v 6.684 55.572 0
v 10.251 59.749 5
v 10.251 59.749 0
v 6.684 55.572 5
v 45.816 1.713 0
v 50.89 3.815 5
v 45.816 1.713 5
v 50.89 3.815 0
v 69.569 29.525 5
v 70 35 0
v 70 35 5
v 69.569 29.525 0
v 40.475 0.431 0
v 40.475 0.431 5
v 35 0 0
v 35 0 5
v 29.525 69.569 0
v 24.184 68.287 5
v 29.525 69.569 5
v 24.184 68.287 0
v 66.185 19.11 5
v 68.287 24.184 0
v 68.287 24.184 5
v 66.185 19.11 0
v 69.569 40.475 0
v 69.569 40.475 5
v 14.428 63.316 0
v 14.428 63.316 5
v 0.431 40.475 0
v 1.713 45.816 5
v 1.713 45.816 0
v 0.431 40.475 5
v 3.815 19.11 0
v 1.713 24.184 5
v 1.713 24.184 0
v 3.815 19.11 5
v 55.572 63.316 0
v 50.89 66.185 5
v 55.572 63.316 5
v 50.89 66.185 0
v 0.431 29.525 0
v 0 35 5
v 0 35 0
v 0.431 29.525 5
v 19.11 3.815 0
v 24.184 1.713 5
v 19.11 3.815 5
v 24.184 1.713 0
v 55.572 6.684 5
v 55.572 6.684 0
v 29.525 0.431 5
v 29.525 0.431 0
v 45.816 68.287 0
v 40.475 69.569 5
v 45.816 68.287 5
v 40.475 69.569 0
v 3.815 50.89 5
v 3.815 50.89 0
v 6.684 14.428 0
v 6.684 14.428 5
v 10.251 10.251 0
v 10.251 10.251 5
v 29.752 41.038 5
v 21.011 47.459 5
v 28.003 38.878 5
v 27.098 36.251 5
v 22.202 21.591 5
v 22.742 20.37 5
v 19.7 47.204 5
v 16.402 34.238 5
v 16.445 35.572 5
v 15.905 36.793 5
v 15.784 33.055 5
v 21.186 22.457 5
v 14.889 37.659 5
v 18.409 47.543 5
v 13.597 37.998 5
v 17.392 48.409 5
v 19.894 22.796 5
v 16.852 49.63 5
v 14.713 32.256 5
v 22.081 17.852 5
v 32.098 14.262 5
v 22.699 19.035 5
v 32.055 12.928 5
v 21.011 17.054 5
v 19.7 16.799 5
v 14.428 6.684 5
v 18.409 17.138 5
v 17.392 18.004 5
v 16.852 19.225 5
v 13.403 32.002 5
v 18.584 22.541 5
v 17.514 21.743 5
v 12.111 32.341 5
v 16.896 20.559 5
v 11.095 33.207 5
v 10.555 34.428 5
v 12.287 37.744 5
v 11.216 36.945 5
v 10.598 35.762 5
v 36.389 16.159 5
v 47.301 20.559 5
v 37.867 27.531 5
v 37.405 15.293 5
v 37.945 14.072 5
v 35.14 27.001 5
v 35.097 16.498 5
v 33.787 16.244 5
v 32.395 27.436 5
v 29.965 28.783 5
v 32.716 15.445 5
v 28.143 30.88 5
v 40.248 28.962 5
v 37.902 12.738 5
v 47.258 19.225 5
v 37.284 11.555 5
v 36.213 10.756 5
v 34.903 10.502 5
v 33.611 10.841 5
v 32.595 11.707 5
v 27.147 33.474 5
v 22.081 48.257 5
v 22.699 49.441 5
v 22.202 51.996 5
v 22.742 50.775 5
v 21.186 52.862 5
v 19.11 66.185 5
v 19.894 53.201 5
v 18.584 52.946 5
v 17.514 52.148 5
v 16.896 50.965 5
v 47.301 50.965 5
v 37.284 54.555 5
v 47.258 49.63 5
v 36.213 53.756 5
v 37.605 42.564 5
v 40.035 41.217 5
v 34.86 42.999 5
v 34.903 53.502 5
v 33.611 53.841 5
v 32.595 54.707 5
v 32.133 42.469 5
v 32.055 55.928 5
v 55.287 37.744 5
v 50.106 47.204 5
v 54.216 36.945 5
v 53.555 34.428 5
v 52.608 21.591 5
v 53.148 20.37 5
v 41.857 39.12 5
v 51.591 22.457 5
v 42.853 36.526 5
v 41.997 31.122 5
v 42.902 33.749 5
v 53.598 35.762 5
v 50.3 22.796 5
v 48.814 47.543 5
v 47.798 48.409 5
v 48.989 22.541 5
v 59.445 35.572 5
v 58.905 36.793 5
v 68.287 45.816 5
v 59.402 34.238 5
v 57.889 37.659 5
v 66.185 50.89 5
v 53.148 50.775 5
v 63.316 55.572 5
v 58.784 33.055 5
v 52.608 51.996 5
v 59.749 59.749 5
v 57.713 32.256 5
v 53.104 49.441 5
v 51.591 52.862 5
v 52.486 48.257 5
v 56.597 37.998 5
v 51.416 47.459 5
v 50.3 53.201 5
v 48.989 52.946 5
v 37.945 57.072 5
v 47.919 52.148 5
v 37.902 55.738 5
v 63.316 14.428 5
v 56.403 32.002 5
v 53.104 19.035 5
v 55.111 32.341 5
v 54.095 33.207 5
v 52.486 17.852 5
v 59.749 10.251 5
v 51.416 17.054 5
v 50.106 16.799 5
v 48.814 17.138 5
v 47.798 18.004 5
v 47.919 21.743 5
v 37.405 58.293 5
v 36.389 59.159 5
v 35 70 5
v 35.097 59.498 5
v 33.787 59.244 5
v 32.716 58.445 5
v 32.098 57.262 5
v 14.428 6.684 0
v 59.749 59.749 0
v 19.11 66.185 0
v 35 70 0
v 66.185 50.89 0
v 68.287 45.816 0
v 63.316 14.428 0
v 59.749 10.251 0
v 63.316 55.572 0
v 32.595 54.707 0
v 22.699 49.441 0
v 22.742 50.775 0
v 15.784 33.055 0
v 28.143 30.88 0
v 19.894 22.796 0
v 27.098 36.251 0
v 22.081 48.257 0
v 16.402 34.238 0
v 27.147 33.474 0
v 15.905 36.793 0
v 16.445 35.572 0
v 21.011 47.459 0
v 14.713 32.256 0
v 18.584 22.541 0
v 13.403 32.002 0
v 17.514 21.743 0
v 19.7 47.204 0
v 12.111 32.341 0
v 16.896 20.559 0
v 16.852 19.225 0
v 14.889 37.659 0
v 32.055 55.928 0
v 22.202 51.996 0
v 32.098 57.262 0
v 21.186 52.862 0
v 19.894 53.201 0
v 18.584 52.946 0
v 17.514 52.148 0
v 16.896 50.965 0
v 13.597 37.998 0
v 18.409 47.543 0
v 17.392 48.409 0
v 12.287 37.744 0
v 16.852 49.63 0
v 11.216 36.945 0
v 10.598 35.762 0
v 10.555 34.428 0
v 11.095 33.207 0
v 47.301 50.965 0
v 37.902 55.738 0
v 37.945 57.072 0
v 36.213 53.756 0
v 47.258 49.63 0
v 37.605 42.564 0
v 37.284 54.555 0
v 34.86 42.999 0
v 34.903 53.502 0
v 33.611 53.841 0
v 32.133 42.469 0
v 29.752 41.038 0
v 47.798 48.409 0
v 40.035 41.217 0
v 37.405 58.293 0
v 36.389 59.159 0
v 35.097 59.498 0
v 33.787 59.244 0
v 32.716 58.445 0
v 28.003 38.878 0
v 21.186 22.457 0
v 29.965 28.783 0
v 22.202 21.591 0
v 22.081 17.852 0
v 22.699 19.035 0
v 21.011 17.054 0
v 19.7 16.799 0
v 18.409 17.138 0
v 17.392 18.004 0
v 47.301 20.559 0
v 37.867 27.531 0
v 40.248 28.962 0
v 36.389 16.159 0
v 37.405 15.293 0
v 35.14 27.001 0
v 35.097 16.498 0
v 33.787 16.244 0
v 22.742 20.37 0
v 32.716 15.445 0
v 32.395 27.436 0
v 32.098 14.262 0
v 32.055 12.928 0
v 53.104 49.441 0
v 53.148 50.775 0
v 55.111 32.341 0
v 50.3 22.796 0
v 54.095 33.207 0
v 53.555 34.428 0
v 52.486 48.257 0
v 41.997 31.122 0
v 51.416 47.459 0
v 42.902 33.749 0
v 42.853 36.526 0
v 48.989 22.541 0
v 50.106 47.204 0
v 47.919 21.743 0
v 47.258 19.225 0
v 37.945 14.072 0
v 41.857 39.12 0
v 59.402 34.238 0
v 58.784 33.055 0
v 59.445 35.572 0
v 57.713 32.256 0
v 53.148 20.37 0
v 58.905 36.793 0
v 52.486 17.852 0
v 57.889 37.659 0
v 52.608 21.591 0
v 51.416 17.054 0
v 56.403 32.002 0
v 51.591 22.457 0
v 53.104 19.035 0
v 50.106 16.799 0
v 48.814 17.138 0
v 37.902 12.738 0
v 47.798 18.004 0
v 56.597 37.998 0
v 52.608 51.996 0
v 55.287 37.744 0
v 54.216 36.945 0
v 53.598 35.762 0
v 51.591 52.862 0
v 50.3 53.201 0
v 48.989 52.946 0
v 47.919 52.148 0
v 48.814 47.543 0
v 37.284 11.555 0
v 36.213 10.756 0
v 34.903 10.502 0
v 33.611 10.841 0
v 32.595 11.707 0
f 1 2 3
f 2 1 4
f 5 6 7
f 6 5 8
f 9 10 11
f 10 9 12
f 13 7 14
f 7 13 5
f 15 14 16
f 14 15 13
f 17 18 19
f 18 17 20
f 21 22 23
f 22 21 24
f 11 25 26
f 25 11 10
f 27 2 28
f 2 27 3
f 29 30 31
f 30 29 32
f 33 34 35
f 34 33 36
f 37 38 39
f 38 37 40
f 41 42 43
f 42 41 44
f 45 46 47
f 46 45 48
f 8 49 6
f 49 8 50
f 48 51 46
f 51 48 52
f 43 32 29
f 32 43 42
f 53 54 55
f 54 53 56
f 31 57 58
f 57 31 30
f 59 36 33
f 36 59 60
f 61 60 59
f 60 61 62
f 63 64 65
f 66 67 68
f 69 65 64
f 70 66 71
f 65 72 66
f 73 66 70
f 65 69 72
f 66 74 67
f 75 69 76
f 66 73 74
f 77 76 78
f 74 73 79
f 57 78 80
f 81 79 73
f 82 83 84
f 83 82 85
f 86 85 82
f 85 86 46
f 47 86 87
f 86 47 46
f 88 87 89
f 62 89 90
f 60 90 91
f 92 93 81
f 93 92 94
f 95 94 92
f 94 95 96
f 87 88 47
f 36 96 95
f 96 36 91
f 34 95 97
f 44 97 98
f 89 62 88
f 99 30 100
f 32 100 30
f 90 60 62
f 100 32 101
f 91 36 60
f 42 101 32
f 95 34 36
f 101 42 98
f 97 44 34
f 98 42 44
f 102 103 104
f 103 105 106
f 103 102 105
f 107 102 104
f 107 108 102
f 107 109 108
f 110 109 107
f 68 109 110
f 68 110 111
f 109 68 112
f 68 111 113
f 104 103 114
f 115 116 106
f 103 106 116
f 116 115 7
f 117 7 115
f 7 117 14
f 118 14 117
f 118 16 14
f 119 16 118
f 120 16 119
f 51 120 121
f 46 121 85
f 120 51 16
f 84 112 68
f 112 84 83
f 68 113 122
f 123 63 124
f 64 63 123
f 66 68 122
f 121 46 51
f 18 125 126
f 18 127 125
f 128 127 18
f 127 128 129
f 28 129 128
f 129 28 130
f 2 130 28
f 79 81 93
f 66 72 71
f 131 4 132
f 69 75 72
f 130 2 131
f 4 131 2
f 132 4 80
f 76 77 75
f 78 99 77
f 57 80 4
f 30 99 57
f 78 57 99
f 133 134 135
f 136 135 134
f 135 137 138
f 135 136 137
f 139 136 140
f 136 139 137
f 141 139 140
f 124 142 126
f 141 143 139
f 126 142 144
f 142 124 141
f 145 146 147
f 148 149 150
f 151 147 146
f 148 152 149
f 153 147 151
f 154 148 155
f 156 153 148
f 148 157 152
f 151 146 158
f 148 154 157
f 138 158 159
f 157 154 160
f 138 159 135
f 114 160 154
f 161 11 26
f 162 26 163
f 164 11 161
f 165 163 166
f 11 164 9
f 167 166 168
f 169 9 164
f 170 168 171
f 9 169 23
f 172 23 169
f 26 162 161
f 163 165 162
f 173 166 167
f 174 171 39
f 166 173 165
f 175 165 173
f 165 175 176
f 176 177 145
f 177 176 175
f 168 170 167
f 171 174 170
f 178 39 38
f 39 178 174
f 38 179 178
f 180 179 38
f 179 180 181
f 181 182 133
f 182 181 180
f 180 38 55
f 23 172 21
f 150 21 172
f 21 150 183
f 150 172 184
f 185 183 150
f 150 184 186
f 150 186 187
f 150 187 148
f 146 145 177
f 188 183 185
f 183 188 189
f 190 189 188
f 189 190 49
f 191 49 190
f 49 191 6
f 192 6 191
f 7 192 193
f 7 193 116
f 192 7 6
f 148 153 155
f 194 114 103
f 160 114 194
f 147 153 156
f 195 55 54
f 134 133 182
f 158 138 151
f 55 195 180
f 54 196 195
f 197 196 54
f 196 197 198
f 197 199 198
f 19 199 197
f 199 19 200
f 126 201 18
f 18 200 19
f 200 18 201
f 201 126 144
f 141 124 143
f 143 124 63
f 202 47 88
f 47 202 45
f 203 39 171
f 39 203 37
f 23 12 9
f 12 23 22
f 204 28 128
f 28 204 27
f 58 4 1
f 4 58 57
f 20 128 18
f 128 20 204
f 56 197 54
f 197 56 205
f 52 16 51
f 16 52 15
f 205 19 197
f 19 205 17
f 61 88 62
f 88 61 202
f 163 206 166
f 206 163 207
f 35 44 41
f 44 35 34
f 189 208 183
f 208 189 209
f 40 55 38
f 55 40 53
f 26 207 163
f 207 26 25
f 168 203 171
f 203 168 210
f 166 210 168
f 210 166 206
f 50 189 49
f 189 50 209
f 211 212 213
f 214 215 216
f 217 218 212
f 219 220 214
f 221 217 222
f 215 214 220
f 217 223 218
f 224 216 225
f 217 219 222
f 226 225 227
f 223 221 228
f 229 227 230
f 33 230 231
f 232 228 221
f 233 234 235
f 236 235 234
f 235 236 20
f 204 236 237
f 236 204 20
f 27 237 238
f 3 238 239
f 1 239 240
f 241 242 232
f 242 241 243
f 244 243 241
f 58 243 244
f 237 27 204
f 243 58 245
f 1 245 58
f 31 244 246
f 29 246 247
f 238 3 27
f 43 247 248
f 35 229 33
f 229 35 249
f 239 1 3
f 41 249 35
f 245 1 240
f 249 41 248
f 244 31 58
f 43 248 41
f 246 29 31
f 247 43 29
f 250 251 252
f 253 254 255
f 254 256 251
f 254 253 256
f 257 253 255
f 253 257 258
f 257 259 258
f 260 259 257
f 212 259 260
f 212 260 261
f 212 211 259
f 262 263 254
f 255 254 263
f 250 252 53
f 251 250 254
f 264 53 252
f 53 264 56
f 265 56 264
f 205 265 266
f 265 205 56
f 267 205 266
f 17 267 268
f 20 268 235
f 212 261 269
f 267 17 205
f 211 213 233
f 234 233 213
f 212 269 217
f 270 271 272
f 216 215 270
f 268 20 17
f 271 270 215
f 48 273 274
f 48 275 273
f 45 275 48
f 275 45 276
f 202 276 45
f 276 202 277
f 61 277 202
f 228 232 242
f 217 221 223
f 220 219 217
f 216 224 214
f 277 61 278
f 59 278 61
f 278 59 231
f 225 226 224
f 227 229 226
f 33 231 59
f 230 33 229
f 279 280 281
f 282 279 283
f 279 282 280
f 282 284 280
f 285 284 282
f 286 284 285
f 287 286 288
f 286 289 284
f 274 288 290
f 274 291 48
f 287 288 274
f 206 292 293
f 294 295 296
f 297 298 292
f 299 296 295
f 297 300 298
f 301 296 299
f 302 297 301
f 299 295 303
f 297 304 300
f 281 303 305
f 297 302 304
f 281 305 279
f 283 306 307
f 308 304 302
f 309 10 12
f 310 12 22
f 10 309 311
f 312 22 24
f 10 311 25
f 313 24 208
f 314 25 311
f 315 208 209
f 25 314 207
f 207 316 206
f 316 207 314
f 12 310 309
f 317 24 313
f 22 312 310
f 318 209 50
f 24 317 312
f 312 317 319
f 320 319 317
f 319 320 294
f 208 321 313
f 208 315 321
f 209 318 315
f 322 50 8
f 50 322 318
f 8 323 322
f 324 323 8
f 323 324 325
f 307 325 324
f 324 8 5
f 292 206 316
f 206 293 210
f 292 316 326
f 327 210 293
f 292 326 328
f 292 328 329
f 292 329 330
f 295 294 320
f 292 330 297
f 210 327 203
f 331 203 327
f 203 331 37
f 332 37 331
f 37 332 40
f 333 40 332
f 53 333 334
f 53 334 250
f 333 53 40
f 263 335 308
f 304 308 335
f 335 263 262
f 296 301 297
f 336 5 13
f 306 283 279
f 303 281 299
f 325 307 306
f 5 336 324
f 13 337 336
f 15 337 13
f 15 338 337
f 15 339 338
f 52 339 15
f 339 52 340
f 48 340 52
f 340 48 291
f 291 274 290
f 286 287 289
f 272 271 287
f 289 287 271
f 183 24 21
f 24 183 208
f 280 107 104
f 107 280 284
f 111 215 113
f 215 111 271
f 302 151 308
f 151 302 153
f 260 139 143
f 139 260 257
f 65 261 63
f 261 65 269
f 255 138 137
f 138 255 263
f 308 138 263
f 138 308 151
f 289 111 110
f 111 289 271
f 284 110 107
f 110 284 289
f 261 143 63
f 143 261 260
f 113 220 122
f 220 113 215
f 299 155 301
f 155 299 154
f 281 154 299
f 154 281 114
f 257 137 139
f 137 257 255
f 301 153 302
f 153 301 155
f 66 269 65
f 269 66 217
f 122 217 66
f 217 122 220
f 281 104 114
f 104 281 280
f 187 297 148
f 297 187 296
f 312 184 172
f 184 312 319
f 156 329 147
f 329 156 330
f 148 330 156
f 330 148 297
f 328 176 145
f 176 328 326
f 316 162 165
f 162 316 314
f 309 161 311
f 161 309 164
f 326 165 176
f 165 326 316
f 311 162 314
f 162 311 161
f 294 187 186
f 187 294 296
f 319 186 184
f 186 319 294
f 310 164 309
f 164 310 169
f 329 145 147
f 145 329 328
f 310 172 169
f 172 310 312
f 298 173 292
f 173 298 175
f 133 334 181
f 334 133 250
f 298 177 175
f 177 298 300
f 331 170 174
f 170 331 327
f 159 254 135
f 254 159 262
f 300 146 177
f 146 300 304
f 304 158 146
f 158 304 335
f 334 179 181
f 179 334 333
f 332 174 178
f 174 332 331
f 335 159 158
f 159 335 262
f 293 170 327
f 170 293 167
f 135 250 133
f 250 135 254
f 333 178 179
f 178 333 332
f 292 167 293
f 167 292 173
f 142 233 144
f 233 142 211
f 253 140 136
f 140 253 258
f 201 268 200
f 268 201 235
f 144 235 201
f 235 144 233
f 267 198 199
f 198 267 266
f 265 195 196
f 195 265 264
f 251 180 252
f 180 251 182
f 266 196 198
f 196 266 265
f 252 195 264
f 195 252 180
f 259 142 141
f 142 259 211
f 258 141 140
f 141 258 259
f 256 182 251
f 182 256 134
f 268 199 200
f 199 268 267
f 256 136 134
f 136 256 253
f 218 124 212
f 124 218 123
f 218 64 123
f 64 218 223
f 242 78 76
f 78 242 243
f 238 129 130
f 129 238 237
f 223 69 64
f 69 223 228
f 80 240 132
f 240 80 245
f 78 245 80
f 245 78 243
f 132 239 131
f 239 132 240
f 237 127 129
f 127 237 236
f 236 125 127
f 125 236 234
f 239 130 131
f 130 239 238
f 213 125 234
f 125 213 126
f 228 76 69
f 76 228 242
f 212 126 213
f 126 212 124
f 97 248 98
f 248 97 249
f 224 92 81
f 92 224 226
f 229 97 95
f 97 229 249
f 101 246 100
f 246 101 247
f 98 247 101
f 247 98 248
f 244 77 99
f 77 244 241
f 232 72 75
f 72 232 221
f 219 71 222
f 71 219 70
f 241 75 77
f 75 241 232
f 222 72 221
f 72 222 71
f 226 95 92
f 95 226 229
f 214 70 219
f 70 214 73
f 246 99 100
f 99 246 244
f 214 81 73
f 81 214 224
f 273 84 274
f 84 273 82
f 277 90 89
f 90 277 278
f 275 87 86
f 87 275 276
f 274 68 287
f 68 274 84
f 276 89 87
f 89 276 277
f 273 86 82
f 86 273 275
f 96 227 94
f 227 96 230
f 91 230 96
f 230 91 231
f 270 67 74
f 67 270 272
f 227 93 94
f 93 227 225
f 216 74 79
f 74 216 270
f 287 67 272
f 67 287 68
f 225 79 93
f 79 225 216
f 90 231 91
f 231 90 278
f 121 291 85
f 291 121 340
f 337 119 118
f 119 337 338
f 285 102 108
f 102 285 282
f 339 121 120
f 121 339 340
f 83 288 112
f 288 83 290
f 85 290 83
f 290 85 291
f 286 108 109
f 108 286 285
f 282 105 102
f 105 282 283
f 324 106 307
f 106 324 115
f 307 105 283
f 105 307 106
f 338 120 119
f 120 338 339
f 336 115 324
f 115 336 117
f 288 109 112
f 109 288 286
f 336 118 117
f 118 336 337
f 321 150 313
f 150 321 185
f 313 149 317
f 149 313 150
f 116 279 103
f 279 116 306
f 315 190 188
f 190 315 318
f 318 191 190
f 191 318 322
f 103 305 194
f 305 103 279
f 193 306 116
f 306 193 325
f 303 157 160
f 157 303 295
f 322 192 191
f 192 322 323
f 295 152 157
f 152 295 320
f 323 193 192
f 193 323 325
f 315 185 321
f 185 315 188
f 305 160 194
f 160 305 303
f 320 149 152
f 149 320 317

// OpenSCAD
$fn = 32;

// ----------------------------------------------------------------------
// Spacer plate: round flange R35, 8 bolts
// ----------------------------------------------------------------------

// --- parameters (mm) ---
bore_r = 8;               // centre bore radius
bolt_r = 3;               // bolt hole radius
plate_t = 5;              // plate thickness, Z (extrusion height)
flange_r = 35;            // flange radius
n_bolt = 8;               // bolt hole count
ring_r = 21.5;            // bolt circle radius

profile = [[70, 35], [69.569, 40.475], [68.287, 45.816], [66.185, 50.89], [63.316, 55.572], [59.749, 59.749], [55.572, 63.316], [50.89, 66.185], [45.816, 68.287], [40.475, 69.569], [35, 70], [29.525, 69.569], [24.184, 68.287], [19.11, 66.185], [14.428, 63.316], [10.251, 59.749], [6.684, 55.572], [3.815, 50.89], [1.713, 45.816], [0.431, 40.475], [0, 35], [0.431, 29.525], [1.713, 24.184], [3.815, 19.11], [6.684, 14.428], [10.251, 10.251], [14.428, 6.684], [19.11, 3.815], [24.184, 1.713], [29.525, 0.431], [35, 0], [40.475, 0.431], [45.816, 1.713], [50.89, 3.815], [55.572, 6.684], [59.749, 10.251], [63.316, 14.428], [66.185, 19.11], [68.287, 24.184], [69.569, 29.525]];  // primary outline, 40 points, counter clockwise
void_1 = [[42.853, 36.526], [41.857, 39.12], [40.035, 41.217], [37.605, 42.564], [34.86, 42.999], [32.133, 42.469], [29.752, 41.038], [28.003, 38.878], [27.098, 36.251], [27.147, 33.474], [28.143, 30.88], [29.965, 28.783], [32.395, 27.436], [35.14, 27.001], [37.867, 27.531], [40.248, 28.962], [41.997, 31.122], [42.902, 33.749]];  // centre bore, 18 points
void_2 = [[59.445, 35.572], [58.905, 36.793], [57.889, 37.659], [56.597, 37.998], [55.287, 37.744], [54.216, 36.945], [53.598, 35.762], [53.555, 34.428], [54.095, 33.207], [55.111, 32.341], [56.403, 32.002], [57.713, 32.256], [58.784, 33.055], [59.402, 34.238]];  // bolt hole 1, 14 points
void_3 = [[53.148, 50.775], [52.608, 51.996], [51.591, 52.862], [50.3, 53.201], [48.989, 52.946], [47.919, 52.148], [47.301, 50.965], [47.258, 49.63], [47.798, 48.409], [48.814, 47.543], [50.106, 47.204], [51.416, 47.459], [52.486, 48.257], [53.104, 49.441]];  // bolt hole 2, 14 points
void_4 = [[37.945, 57.072], [37.405, 58.293], [36.389, 59.159], [35.097, 59.498], [33.787, 59.244], [32.716, 58.445], [32.098, 57.262], [32.055, 55.928], [32.595, 54.707], [33.611, 53.841], [34.903, 53.502], [36.213, 53.756], [37.284, 54.555], [37.902, 55.738]];  // bolt hole 3, 14 points
void_5 = [[22.742, 50.775], [22.202, 51.996], [21.186, 52.862], [19.894, 53.201], [18.584, 52.946], [17.514, 52.148], [16.896, 50.965], [16.852, 49.63], [17.392, 48.409], [18.409, 47.543], [19.7, 47.204], [21.011, 47.459], [22.081, 48.257], [22.699, 49.441]];  // bolt hole 4, 14 points
void_6 = [[16.445, 35.572], [15.905, 36.793], [14.889, 37.659], [13.597, 37.998], [12.287, 37.744], [11.216, 36.945], [10.598, 35.762], [10.555, 34.428], [11.095, 33.207], [12.111, 32.341], [13.403, 32.002], [14.713, 32.256], [15.784, 33.055], [16.402, 34.238]];  // bolt hole 5, 14 points
void_7 = [[22.742, 20.37], [22.202, 21.591], [21.186, 22.457], [19.894, 22.796], [18.584, 22.541], [17.514, 21.743], [16.896, 20.559], [16.852, 19.225], [17.392, 18.004], [18.409, 17.138], [19.7, 16.799], [21.011, 17.054], [22.081, 17.852], [22.699, 19.035]];  // bolt hole 6, 14 points
void_8 = [[37.945, 14.072], [37.405, 15.293], [36.389, 16.159], [35.097, 16.498], [33.787, 16.244], [32.716, 15.445], [32.098, 14.262], [32.055, 12.928], [32.595, 11.707], [33.611, 10.841], [34.903, 10.502], [36.213, 10.756], [37.284, 11.555], [37.902, 12.738]];  // bolt hole 7, 14 points
void_9 = [[53.148, 20.37], [52.608, 21.591], [51.591, 22.457], [50.3, 22.796], [48.989, 22.541], [47.919, 21.743], [47.301, 20.559], [47.258, 19.225], [47.798, 18.004], [48.814, 17.138], [50.106, 16.799], [51.416, 17.054], [52.486, 17.852], [53.104, 19.035]];  // bolt hole 8, 14 points

// --- the one profile operation ---
difference() {
  linear_extrude(height = plate_t) polygon(points = profile);
  translate([0, 0, -1])
    linear_extrude(height = plate_t + 2) polygon(points = void_1);
  translate([0, 0, -1])
    linear_extrude(height = plate_t + 2) polygon(points = void_2);
  translate([0, 0, -1])
    linear_extrude(height = plate_t + 2) polygon(points = void_3);
  translate([0, 0, -1])
    linear_extrude(height = plate_t + 2) polygon(points = void_4);
  translate([0, 0, -1])
    linear_extrude(height = plate_t + 2) polygon(points = void_5);
  translate([0, 0, -1])
    linear_extrude(height = plate_t + 2) polygon(points = void_6);
  translate([0, 0, -1])
    linear_extrude(height = plate_t + 2) polygon(points = void_7);
  translate([0, 0, -1])
    linear_extrude(height = plate_t + 2) polygon(points = void_8);
  translate([0, 0, -1])
    linear_extrude(height = plate_t + 2) polygon(points = void_9);
}
